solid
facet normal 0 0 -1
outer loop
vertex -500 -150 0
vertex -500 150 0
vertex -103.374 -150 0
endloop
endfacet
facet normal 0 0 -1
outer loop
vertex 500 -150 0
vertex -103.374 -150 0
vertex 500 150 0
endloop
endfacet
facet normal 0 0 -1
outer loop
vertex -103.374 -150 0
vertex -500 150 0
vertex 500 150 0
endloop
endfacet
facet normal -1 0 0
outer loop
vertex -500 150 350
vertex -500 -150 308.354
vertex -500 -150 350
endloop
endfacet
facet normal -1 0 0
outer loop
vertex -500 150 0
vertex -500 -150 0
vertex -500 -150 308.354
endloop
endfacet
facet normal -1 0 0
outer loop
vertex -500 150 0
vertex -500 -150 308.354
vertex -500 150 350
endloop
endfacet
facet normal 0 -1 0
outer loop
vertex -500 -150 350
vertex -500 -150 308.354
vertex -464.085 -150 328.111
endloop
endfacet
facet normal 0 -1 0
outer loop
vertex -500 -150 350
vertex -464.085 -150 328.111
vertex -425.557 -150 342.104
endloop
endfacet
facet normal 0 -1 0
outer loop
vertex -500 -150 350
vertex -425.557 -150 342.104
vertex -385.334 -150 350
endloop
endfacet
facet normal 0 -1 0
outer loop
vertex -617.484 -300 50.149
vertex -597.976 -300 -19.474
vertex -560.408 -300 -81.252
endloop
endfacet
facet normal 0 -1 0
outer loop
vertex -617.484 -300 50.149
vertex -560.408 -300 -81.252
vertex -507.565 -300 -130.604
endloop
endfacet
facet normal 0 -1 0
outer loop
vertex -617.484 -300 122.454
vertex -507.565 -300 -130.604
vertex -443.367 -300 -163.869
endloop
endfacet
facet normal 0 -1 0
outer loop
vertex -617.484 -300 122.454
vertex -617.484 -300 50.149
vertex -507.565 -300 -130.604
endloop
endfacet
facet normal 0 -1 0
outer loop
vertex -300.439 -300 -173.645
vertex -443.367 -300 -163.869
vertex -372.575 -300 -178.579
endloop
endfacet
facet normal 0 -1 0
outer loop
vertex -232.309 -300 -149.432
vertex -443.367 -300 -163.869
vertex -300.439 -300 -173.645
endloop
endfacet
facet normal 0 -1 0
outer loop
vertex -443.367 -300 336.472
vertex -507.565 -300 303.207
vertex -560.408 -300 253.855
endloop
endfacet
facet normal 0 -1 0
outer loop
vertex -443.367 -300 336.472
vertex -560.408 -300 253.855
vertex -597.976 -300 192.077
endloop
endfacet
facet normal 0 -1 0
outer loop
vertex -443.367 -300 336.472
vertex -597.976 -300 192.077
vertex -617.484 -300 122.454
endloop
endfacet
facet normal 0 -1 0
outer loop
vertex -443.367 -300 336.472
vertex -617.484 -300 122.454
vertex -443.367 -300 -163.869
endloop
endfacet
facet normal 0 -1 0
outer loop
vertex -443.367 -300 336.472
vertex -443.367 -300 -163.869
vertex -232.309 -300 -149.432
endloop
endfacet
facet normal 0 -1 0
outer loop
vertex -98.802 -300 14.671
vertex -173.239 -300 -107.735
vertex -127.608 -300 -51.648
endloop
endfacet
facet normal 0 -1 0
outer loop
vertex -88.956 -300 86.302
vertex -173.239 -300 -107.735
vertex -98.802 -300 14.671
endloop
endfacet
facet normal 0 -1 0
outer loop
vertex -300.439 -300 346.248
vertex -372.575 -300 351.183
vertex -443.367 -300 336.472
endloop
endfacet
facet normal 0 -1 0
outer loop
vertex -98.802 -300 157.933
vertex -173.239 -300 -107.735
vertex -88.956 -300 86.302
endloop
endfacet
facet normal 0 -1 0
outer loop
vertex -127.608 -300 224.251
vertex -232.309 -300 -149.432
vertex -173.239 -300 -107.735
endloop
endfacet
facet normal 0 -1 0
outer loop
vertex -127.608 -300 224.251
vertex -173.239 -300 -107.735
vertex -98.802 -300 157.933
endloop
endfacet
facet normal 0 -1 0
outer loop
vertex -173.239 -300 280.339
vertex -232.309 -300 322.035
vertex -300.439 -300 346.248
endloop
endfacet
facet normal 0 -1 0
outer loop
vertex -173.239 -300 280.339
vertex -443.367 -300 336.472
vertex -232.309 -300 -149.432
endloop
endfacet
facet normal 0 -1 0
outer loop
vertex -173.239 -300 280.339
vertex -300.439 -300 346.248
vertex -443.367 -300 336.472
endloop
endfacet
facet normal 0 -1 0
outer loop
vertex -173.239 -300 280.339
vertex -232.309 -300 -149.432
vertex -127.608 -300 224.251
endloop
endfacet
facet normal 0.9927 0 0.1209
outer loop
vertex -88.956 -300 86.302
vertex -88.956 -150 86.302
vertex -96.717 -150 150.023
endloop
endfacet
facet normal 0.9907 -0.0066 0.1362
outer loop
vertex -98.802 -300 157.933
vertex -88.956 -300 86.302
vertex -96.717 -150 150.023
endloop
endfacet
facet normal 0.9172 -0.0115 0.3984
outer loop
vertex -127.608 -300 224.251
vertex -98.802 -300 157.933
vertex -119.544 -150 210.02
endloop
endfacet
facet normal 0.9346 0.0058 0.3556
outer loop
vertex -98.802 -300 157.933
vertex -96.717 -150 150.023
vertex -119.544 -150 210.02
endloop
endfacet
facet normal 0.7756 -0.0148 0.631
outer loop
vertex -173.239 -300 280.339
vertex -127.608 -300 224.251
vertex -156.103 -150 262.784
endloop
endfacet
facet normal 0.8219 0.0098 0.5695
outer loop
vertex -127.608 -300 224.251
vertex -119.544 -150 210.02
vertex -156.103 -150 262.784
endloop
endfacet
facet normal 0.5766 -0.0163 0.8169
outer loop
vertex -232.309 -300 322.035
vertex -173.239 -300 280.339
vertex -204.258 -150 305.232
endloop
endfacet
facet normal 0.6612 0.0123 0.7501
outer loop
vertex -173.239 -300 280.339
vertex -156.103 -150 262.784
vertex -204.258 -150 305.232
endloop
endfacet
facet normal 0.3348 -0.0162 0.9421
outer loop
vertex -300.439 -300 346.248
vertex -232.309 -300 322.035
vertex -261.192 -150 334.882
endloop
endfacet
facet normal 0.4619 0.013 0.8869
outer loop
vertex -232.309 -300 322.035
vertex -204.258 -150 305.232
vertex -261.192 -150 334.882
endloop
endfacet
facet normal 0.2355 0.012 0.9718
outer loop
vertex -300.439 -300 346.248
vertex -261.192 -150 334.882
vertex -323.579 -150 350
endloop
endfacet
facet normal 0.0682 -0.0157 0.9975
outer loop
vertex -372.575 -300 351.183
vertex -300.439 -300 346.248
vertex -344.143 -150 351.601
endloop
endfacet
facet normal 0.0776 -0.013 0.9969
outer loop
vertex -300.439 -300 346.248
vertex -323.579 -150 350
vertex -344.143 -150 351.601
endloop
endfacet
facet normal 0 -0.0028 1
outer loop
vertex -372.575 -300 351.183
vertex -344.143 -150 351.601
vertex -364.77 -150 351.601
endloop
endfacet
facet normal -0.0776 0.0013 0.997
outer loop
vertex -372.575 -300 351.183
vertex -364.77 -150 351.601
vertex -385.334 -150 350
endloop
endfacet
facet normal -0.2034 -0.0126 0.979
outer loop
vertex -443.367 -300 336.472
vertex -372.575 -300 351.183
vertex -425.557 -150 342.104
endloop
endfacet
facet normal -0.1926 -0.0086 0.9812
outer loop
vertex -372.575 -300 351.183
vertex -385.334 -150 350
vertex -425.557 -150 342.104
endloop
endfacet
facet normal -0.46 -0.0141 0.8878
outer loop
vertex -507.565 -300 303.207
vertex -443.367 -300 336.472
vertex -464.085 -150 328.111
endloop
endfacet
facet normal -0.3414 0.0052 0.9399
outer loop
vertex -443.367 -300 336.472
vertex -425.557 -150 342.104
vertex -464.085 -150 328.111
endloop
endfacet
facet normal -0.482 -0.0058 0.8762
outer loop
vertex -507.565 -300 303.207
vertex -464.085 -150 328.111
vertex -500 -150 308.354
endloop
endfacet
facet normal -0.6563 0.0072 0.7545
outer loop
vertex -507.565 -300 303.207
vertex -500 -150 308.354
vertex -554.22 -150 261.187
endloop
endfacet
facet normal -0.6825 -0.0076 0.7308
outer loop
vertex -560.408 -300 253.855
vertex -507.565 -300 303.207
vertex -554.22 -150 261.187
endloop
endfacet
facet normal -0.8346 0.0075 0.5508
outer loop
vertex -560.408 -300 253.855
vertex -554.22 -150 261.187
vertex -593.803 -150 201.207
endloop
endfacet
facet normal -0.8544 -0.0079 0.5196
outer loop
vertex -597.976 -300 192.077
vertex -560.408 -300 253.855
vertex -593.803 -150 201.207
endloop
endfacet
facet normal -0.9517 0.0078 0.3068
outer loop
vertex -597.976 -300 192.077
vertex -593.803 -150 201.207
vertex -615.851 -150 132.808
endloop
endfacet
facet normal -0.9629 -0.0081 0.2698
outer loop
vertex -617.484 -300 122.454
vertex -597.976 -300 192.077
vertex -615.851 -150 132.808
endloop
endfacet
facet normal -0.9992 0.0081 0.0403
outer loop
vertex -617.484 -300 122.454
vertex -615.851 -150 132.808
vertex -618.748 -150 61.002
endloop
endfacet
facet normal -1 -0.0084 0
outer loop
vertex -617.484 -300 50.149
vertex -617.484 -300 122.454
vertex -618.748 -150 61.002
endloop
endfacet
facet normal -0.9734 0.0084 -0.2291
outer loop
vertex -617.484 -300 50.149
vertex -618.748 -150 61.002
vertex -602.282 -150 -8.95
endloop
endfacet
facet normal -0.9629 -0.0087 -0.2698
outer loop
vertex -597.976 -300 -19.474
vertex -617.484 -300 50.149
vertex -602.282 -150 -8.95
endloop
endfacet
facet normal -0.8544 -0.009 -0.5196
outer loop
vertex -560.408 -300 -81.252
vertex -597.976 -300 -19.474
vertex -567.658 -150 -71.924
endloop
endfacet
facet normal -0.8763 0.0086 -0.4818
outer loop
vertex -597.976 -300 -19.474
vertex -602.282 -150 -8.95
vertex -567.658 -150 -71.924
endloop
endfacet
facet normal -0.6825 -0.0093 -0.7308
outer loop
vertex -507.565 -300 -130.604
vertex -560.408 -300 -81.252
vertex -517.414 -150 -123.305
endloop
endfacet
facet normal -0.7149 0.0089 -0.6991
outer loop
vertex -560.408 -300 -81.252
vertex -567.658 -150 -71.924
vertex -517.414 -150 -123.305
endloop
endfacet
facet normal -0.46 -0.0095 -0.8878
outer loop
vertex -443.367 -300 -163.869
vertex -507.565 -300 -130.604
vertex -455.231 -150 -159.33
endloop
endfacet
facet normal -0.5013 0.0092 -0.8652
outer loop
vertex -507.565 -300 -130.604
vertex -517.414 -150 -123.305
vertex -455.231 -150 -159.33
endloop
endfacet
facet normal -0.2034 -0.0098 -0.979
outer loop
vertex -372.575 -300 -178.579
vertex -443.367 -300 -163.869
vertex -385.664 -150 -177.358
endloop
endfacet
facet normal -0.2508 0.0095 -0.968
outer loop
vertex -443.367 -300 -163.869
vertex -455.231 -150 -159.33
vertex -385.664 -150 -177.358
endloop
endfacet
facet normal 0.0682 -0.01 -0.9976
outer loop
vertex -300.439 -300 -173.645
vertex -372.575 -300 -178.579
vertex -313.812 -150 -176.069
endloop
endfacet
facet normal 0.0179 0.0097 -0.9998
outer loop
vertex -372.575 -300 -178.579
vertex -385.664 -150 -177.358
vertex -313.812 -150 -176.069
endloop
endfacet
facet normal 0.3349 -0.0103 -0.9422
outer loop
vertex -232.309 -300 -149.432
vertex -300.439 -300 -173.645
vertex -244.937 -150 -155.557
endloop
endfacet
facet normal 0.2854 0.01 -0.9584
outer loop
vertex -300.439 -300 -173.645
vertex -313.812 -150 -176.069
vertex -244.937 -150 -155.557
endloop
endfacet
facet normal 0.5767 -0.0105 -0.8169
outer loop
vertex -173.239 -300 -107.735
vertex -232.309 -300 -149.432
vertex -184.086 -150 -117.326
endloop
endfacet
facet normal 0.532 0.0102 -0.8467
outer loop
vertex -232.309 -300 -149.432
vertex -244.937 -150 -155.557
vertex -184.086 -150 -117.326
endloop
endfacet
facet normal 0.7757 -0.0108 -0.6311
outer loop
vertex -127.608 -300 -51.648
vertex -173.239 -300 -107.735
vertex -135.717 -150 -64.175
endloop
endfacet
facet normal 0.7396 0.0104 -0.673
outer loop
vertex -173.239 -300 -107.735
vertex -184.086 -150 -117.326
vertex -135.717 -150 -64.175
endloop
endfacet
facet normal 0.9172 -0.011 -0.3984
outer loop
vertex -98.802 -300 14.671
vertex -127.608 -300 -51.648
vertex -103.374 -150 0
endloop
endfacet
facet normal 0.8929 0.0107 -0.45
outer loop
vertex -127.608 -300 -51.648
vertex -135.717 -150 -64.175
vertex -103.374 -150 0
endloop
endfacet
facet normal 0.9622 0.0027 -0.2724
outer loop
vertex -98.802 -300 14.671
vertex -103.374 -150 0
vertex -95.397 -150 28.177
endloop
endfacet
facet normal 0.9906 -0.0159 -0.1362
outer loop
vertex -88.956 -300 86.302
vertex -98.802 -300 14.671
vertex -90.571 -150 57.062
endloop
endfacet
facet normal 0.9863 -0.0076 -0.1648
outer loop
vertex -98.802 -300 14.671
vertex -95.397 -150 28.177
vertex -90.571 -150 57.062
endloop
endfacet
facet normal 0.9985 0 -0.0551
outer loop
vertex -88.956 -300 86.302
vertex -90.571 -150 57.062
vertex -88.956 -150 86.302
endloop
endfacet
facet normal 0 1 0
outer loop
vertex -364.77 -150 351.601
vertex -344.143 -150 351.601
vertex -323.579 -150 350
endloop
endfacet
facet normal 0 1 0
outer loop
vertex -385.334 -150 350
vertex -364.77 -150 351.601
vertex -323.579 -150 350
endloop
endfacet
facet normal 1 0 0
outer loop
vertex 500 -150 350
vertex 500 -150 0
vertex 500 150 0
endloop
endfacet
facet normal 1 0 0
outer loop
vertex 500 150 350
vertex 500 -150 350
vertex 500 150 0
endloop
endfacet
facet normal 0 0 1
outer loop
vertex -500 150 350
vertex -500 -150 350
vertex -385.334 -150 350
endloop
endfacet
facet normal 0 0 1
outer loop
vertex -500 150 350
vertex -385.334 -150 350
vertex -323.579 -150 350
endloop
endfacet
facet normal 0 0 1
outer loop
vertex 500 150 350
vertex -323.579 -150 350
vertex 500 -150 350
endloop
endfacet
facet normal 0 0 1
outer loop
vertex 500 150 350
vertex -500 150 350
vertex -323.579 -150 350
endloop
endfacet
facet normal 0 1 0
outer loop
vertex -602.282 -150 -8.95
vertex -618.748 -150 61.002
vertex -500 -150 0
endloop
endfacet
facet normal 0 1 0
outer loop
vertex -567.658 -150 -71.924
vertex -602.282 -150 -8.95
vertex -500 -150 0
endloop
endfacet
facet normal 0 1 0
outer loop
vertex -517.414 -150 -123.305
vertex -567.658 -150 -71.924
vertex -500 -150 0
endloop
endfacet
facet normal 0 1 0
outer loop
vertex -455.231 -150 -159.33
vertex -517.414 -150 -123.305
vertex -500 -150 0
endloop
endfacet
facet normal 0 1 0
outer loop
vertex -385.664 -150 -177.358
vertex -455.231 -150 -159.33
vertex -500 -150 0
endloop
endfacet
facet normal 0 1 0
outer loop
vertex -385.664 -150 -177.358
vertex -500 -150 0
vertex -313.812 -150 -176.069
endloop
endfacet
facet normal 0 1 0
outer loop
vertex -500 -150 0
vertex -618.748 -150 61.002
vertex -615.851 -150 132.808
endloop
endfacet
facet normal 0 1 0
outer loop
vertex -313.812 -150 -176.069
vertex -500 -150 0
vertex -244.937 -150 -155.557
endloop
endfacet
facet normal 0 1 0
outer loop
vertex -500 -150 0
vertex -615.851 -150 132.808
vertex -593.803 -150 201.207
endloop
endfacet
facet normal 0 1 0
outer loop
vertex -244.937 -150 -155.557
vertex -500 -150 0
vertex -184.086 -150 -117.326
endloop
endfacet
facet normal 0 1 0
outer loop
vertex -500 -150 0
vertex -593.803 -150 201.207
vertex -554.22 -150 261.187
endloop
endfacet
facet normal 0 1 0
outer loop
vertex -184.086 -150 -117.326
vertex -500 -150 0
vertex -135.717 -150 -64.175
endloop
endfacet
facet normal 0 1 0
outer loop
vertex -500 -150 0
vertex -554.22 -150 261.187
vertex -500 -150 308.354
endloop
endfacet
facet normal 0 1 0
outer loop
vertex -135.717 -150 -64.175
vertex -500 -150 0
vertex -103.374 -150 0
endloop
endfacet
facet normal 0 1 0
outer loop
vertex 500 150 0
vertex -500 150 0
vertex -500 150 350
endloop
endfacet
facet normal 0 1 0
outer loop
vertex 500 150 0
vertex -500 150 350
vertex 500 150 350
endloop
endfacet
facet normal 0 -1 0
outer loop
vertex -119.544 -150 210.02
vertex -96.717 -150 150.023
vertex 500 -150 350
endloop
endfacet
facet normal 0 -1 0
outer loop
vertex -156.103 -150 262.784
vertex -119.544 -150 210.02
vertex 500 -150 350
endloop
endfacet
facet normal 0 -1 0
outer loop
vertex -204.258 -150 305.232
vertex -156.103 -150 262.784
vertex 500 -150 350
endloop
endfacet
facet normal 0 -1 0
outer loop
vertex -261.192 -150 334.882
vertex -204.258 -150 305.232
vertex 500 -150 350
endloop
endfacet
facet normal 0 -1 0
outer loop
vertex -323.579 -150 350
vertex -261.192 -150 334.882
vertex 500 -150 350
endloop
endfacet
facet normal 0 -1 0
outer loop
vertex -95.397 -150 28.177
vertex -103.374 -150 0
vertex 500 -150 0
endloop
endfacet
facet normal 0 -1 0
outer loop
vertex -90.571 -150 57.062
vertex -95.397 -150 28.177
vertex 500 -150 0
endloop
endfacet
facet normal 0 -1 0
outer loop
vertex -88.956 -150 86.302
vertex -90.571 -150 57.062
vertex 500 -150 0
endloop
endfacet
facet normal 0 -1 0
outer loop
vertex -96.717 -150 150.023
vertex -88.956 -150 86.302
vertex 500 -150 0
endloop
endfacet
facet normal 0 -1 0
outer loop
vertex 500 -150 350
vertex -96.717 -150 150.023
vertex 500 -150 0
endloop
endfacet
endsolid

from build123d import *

# Parameters (mm, degrees)
F0_W     = 1000
F0_H     = 300
F1_DEPTH = 350
F2_R     = 265.5
F2_R_2   = 190.5
F3_DEPTH = 150


with BuildPart() as f1:
    # F0 (on Top) → F1 (new body)
    with BuildSketch(Plane.XY):
        Rectangle(F0_W, F0_H)
    extrude(amount=F1_DEPTH)

    # F2 (on face) → F3 (join)
    with BuildSketch(Plane.XZ.offset(150)):
        with Locations((-354.456395, 86.301595)):
            Circle(F2_R)
        with Locations((-354.456395, 86.301595)):
            Circle(F2_R_2, mode=Mode.SUBTRACT)
        with BuildLine():
            Line((-500, 0), (-500, 209.213389))
            ThreePointArc((-500, 209.213389), (-459.765558, -72.444209), (-184.626231, 0))
            Line((-184.626231, 0), (-500, 0))
        make_face()
        with BuildLine():
            ThreePointArc((-184.626231, 0), (-169.195908, 41.930412), (-163.956395, 86.301595))
            ThreePointArc((-163.956395, 86.301595), (-289.018664, 265.209821), (-500, 209.213389))
            Line((-500, 209.213389), (-500, 0))
            Line((-500, 0), (-184.626231, 0))
        make_face()
    extrude(amount=F3_DEPTH)


solid = f1.part
